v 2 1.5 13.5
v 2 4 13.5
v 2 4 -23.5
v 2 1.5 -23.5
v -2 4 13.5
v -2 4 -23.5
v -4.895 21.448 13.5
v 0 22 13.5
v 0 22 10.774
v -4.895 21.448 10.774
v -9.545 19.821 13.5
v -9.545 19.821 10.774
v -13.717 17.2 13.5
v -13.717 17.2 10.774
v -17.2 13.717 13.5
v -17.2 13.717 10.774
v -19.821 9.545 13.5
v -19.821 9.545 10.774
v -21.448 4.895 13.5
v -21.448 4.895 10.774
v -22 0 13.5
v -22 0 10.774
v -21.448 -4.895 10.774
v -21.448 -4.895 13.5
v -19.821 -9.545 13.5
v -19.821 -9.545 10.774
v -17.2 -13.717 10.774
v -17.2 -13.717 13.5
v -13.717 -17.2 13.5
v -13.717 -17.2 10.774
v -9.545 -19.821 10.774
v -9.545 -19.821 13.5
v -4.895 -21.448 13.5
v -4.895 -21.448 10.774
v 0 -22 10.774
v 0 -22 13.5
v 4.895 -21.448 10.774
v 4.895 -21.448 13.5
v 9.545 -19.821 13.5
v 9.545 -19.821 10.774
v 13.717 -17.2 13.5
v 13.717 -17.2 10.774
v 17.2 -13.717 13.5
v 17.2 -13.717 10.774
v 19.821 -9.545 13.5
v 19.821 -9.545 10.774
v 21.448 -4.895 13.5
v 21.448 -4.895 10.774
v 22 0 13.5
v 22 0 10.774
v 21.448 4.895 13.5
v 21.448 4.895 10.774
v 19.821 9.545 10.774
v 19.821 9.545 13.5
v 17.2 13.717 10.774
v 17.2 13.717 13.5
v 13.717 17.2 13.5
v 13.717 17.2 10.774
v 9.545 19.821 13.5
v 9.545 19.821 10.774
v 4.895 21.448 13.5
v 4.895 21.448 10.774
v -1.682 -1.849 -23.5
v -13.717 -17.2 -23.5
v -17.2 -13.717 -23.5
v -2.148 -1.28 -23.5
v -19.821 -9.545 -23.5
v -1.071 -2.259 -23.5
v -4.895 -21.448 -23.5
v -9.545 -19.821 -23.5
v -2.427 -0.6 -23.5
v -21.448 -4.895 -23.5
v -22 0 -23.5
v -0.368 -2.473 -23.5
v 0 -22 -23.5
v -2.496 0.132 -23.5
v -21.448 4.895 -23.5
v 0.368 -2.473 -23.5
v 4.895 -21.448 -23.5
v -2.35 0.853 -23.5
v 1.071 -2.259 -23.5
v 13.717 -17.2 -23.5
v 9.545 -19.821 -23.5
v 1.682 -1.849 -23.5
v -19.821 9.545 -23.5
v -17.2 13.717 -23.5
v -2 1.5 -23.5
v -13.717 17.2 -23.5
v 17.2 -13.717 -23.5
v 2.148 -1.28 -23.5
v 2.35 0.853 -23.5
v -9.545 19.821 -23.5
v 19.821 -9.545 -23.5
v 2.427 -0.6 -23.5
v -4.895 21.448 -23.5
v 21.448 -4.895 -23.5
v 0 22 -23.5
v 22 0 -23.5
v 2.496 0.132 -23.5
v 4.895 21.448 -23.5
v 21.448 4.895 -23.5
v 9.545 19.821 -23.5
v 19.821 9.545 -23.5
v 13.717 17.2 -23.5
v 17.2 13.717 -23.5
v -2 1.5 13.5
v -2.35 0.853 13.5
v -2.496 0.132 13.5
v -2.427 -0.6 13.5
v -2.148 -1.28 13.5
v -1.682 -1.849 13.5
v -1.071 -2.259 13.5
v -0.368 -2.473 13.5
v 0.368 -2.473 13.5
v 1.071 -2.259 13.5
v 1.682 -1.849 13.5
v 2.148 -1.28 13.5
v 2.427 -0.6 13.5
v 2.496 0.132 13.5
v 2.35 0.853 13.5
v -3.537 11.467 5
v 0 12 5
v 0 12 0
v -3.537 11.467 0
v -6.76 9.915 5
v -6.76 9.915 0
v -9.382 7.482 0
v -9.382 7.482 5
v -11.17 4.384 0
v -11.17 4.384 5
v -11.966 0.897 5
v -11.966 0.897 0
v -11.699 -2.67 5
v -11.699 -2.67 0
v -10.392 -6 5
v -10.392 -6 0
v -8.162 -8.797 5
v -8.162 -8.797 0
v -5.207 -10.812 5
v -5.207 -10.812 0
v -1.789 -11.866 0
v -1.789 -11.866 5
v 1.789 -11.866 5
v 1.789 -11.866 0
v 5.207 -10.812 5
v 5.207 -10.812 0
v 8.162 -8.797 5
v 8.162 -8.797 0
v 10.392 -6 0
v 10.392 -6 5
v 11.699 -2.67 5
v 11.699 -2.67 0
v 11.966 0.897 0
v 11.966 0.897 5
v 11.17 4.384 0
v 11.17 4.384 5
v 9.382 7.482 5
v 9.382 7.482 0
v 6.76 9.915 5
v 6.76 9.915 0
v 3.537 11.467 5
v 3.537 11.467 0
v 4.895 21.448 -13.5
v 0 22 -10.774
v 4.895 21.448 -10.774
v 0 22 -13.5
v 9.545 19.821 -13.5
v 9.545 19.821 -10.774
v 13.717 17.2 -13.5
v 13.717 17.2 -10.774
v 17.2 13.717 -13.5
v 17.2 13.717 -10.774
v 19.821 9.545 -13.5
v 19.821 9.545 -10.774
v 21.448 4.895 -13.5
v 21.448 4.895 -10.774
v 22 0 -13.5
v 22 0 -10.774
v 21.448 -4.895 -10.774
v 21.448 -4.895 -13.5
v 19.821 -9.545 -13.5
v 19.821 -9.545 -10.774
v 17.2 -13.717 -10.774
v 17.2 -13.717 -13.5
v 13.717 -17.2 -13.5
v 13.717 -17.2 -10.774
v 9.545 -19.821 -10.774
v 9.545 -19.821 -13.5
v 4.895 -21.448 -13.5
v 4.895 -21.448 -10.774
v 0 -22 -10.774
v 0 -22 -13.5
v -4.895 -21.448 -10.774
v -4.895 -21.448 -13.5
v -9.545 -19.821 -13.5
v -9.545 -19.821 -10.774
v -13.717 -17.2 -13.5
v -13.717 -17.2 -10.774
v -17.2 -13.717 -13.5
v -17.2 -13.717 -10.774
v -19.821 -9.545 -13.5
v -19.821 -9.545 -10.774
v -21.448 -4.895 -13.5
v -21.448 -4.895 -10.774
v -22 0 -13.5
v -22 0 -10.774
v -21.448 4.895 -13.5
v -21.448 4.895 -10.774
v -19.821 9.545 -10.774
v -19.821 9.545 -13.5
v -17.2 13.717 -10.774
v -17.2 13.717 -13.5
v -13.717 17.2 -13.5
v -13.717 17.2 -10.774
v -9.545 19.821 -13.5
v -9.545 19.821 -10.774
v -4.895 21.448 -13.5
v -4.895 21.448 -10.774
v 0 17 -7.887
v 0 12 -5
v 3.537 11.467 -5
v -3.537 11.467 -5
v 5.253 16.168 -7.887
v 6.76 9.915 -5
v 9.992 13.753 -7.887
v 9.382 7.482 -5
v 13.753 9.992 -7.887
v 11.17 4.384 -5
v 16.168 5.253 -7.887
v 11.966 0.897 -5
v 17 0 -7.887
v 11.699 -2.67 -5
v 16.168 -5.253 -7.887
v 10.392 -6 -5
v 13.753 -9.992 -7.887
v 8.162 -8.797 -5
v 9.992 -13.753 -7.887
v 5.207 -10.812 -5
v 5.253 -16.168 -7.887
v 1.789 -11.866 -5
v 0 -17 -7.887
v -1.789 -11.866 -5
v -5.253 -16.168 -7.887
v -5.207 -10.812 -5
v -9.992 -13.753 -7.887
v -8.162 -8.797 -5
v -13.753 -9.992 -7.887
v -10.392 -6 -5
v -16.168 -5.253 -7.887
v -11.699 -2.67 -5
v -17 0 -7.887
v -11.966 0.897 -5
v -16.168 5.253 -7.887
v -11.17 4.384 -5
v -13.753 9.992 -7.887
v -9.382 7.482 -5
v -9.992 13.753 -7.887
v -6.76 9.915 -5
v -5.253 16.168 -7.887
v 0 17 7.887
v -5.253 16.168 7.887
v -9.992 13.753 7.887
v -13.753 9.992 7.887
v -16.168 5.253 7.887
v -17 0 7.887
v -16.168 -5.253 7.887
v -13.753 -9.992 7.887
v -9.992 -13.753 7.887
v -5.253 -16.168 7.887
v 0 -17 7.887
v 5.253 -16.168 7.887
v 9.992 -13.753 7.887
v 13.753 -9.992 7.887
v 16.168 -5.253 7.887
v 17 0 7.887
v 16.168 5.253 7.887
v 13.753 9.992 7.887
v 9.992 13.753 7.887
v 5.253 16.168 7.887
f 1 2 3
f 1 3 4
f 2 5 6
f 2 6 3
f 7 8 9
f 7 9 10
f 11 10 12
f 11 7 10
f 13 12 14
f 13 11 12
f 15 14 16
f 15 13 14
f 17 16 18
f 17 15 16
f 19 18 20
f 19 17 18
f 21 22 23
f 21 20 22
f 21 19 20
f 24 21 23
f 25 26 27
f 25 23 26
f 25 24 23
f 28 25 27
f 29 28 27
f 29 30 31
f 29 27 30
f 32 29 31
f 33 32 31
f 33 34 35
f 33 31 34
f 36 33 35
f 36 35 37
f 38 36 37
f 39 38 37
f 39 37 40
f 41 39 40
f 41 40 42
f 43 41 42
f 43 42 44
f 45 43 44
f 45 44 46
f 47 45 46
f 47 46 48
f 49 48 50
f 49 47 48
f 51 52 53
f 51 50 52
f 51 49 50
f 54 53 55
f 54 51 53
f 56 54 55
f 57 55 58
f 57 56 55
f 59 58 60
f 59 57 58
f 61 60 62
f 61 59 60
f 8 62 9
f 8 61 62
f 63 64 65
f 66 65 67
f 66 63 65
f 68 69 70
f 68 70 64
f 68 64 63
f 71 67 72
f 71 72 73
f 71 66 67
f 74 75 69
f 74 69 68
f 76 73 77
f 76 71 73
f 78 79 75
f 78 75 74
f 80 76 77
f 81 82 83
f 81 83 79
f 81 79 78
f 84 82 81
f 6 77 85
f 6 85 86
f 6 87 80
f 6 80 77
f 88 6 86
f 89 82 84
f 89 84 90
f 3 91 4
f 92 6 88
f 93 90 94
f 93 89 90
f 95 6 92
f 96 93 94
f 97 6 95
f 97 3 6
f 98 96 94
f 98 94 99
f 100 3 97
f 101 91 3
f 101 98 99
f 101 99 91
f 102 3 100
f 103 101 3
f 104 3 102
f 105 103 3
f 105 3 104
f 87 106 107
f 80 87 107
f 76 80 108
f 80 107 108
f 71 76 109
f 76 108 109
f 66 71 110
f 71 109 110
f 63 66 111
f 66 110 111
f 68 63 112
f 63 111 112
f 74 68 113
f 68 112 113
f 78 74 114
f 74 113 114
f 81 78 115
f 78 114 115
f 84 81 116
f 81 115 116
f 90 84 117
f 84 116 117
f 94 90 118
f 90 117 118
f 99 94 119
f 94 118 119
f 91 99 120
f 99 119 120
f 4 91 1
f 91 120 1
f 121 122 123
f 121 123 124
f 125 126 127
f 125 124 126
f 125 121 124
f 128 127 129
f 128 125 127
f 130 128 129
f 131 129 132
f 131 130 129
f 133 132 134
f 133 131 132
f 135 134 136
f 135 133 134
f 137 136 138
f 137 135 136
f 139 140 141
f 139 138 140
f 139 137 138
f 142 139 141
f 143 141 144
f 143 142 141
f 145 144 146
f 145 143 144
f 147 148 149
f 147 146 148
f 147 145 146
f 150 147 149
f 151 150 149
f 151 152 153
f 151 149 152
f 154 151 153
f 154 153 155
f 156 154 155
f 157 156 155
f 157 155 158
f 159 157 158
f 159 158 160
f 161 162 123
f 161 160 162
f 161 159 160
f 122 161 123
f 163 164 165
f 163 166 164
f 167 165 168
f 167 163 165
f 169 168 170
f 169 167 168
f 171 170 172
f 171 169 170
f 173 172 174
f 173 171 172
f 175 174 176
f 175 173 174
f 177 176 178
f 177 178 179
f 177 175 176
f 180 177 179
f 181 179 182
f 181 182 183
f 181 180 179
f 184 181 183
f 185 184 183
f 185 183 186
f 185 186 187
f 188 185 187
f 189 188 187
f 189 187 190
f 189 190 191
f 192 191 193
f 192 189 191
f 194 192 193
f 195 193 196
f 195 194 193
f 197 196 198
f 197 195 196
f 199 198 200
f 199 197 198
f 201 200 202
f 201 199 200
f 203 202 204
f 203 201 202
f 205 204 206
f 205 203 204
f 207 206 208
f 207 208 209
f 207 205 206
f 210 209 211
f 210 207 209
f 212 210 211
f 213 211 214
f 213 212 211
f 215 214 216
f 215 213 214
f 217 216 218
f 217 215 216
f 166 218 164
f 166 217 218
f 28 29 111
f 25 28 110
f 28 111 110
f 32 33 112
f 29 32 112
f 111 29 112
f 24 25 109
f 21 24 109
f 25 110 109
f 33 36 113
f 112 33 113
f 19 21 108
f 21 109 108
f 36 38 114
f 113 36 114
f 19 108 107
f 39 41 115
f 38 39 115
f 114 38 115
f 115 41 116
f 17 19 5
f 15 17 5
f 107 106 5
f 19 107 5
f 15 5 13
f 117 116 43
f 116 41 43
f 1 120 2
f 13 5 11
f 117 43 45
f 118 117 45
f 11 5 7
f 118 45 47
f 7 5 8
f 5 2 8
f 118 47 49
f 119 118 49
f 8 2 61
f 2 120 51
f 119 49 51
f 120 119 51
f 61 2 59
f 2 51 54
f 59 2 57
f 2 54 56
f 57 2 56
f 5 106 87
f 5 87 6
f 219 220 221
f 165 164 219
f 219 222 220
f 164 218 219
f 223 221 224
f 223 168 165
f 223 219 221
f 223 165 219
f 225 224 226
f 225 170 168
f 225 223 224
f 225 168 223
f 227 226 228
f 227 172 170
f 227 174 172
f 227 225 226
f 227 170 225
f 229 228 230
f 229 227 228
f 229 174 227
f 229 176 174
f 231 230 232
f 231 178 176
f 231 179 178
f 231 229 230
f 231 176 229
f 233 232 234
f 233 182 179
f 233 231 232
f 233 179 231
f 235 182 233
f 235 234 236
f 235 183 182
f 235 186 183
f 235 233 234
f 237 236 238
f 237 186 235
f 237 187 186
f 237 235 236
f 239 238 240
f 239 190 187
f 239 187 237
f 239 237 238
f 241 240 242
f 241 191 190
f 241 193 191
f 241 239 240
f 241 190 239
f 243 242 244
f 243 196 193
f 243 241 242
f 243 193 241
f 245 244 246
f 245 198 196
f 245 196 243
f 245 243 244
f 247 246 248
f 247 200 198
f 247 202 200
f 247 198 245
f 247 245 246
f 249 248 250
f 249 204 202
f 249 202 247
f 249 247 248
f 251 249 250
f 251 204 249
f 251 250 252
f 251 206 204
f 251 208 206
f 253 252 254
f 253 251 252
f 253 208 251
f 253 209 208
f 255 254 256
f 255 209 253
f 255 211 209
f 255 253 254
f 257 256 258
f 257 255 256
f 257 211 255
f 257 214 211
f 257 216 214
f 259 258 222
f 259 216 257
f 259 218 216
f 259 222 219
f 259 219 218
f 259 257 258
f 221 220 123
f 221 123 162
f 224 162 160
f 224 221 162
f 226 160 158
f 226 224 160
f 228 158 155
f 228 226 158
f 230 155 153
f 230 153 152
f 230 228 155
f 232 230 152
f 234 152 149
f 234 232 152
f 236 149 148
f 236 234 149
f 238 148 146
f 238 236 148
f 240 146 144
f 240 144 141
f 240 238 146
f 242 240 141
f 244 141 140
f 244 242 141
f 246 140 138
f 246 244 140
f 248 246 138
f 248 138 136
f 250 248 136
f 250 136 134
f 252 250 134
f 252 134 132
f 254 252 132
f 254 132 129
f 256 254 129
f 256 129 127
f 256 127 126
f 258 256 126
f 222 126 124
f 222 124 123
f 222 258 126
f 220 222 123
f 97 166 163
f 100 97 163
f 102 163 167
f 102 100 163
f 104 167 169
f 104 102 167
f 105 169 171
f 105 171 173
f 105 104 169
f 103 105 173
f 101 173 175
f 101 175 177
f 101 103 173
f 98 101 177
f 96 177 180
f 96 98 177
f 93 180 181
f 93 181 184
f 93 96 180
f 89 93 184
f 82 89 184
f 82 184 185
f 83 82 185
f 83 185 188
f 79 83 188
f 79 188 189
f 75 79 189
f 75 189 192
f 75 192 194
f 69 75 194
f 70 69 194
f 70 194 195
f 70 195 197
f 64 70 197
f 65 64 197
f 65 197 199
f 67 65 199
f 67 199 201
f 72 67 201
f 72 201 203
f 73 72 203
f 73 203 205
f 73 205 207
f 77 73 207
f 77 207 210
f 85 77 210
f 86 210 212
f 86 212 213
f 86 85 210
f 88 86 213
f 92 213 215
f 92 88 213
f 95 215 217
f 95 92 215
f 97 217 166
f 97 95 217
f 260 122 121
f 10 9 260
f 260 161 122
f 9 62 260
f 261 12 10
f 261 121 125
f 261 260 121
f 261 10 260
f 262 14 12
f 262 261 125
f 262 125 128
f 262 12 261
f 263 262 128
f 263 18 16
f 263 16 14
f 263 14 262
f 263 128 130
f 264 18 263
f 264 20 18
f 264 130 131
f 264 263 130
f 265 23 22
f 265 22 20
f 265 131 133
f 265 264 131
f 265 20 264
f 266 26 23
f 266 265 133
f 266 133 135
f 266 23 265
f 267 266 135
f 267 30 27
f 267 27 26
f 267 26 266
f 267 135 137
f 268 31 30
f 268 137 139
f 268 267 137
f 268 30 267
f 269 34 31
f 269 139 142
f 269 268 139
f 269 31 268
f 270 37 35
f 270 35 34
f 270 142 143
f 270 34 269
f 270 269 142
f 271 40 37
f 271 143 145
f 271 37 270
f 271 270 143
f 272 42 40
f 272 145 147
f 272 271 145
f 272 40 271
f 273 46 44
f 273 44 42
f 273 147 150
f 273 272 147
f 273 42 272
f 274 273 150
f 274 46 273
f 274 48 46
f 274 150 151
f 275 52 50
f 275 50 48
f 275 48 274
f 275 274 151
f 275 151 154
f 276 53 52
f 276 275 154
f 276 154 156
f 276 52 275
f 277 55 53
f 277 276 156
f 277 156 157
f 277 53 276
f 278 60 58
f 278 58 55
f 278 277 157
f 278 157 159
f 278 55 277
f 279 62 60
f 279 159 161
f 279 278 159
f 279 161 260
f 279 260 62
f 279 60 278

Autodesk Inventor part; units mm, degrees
ref_plane "YZ Plane" through (0, 0, 0) normal (1, 0, 0) x (0, 1, 0)
ref_plane "XZ Plane" through (0, 0, 0) normal (0, 1, 0) x (-1, 0, 0)
ref_plane "XY Plane" through (0, 0, 0) normal (0, 0, 1) x (1, 0, 0)
sketch "Sketch2" plane through (0, 0, 0) normal (1, 0, 0) x (0, 1, 0)
  line L0 (0, 0) -> (12, 0) construction
  line L1 (12, 0) -> (12, -5)
  line L2 (12, -5) -> (22, -10.7735)
  line L3 (22, -10.7735) -> (22, -13.5)
  line L4 (22, -13.5) -> (0, -13.5)
  line L5 (0, -13.5) -> (0, 0)
  line L6 (12, 0) -> (12, 5)
  line L7 (12, 5) -> (22, 10.7735)
  line L8 (22, 10.7735) -> (22, 13.5)
  line L9 (22, 13.5) -> (0, 13.5)
  line L10 (0, 13.5) -> (0, 0)
  line L11 (0, 0) -> (0, -46.5785) construction
  line L12 (22, -13.5) -> (22, -23.5)
  line L13 (22, -23.5) -> (0, -23.5)
  line L14 (0, -13.5) -> (0, -23.5)
  dimension "d0" = 22
  dimension "d1" = 13.5
  dimension "d2" = 5
  dimension "d3" = 60
  dimension "d4" = 10
  dimension "d16" = 10
revolve "Revolution1" add sketch "Sketch2" angle 360 about axis through (0, 0, 0) along (0, 0, -1)
sketch "Sketch3" plane through (0, 0, 13.5) normal (0, 0, 1) x (1, 0, 0)
  circle A0 centre (0, 0) radius 2.5
  line L0 (-2, 4) -> (2, 4)
  line L1 (2, 4) -> (2, -2.0439)
  line L2 (2, -2.0439) -> (-2, -2.0439)
  line L3 (-2, -2.0439) -> (-2, 4)
  line L4 (-2, 4) -> (2, -2.0439) construction
  line L5 (2, 4) -> (-2, -2.0439) construction
  line L6 (-5.2122, 2.5) -> (6.1572, 2.5) construction
  point P0 (0, 0.9781)
  point P1 (-2, 1.5)
  point P2 (2, 1.5)
  dimension "d6" = 5
  dimension "d7" = 4
  dimension "d9" = 1.5
extrude "Extrusion1" cut sketch "Sketch3" against normal through all contours A0 L1 | L1 A0 L2 L3 | A0 L3 L0 L1 | L3 A0 | A0 L2
sketch "Sketch4" plane through (0, 0, -23.5) normal (0, 0, 1) x (1, 0, 0)
  circle A0 centre (0, -17) radius 3
  arc A1 (-2, 1.5) -> (2, 1.5) centre (0, 0) ccw construction
  line L0 (0, 0) -> (0, -2.5) construction
  line L1 (0, -2.5) -> (0, -17) construction
  line L2 (0, -17) -> (0, -25) construction
  circle A2 centre (0, 0) radius 25 construction
  dimension "d12" = 6
  dimension "d17" = 8
properties part number "Vbelt Drive Pulley"
